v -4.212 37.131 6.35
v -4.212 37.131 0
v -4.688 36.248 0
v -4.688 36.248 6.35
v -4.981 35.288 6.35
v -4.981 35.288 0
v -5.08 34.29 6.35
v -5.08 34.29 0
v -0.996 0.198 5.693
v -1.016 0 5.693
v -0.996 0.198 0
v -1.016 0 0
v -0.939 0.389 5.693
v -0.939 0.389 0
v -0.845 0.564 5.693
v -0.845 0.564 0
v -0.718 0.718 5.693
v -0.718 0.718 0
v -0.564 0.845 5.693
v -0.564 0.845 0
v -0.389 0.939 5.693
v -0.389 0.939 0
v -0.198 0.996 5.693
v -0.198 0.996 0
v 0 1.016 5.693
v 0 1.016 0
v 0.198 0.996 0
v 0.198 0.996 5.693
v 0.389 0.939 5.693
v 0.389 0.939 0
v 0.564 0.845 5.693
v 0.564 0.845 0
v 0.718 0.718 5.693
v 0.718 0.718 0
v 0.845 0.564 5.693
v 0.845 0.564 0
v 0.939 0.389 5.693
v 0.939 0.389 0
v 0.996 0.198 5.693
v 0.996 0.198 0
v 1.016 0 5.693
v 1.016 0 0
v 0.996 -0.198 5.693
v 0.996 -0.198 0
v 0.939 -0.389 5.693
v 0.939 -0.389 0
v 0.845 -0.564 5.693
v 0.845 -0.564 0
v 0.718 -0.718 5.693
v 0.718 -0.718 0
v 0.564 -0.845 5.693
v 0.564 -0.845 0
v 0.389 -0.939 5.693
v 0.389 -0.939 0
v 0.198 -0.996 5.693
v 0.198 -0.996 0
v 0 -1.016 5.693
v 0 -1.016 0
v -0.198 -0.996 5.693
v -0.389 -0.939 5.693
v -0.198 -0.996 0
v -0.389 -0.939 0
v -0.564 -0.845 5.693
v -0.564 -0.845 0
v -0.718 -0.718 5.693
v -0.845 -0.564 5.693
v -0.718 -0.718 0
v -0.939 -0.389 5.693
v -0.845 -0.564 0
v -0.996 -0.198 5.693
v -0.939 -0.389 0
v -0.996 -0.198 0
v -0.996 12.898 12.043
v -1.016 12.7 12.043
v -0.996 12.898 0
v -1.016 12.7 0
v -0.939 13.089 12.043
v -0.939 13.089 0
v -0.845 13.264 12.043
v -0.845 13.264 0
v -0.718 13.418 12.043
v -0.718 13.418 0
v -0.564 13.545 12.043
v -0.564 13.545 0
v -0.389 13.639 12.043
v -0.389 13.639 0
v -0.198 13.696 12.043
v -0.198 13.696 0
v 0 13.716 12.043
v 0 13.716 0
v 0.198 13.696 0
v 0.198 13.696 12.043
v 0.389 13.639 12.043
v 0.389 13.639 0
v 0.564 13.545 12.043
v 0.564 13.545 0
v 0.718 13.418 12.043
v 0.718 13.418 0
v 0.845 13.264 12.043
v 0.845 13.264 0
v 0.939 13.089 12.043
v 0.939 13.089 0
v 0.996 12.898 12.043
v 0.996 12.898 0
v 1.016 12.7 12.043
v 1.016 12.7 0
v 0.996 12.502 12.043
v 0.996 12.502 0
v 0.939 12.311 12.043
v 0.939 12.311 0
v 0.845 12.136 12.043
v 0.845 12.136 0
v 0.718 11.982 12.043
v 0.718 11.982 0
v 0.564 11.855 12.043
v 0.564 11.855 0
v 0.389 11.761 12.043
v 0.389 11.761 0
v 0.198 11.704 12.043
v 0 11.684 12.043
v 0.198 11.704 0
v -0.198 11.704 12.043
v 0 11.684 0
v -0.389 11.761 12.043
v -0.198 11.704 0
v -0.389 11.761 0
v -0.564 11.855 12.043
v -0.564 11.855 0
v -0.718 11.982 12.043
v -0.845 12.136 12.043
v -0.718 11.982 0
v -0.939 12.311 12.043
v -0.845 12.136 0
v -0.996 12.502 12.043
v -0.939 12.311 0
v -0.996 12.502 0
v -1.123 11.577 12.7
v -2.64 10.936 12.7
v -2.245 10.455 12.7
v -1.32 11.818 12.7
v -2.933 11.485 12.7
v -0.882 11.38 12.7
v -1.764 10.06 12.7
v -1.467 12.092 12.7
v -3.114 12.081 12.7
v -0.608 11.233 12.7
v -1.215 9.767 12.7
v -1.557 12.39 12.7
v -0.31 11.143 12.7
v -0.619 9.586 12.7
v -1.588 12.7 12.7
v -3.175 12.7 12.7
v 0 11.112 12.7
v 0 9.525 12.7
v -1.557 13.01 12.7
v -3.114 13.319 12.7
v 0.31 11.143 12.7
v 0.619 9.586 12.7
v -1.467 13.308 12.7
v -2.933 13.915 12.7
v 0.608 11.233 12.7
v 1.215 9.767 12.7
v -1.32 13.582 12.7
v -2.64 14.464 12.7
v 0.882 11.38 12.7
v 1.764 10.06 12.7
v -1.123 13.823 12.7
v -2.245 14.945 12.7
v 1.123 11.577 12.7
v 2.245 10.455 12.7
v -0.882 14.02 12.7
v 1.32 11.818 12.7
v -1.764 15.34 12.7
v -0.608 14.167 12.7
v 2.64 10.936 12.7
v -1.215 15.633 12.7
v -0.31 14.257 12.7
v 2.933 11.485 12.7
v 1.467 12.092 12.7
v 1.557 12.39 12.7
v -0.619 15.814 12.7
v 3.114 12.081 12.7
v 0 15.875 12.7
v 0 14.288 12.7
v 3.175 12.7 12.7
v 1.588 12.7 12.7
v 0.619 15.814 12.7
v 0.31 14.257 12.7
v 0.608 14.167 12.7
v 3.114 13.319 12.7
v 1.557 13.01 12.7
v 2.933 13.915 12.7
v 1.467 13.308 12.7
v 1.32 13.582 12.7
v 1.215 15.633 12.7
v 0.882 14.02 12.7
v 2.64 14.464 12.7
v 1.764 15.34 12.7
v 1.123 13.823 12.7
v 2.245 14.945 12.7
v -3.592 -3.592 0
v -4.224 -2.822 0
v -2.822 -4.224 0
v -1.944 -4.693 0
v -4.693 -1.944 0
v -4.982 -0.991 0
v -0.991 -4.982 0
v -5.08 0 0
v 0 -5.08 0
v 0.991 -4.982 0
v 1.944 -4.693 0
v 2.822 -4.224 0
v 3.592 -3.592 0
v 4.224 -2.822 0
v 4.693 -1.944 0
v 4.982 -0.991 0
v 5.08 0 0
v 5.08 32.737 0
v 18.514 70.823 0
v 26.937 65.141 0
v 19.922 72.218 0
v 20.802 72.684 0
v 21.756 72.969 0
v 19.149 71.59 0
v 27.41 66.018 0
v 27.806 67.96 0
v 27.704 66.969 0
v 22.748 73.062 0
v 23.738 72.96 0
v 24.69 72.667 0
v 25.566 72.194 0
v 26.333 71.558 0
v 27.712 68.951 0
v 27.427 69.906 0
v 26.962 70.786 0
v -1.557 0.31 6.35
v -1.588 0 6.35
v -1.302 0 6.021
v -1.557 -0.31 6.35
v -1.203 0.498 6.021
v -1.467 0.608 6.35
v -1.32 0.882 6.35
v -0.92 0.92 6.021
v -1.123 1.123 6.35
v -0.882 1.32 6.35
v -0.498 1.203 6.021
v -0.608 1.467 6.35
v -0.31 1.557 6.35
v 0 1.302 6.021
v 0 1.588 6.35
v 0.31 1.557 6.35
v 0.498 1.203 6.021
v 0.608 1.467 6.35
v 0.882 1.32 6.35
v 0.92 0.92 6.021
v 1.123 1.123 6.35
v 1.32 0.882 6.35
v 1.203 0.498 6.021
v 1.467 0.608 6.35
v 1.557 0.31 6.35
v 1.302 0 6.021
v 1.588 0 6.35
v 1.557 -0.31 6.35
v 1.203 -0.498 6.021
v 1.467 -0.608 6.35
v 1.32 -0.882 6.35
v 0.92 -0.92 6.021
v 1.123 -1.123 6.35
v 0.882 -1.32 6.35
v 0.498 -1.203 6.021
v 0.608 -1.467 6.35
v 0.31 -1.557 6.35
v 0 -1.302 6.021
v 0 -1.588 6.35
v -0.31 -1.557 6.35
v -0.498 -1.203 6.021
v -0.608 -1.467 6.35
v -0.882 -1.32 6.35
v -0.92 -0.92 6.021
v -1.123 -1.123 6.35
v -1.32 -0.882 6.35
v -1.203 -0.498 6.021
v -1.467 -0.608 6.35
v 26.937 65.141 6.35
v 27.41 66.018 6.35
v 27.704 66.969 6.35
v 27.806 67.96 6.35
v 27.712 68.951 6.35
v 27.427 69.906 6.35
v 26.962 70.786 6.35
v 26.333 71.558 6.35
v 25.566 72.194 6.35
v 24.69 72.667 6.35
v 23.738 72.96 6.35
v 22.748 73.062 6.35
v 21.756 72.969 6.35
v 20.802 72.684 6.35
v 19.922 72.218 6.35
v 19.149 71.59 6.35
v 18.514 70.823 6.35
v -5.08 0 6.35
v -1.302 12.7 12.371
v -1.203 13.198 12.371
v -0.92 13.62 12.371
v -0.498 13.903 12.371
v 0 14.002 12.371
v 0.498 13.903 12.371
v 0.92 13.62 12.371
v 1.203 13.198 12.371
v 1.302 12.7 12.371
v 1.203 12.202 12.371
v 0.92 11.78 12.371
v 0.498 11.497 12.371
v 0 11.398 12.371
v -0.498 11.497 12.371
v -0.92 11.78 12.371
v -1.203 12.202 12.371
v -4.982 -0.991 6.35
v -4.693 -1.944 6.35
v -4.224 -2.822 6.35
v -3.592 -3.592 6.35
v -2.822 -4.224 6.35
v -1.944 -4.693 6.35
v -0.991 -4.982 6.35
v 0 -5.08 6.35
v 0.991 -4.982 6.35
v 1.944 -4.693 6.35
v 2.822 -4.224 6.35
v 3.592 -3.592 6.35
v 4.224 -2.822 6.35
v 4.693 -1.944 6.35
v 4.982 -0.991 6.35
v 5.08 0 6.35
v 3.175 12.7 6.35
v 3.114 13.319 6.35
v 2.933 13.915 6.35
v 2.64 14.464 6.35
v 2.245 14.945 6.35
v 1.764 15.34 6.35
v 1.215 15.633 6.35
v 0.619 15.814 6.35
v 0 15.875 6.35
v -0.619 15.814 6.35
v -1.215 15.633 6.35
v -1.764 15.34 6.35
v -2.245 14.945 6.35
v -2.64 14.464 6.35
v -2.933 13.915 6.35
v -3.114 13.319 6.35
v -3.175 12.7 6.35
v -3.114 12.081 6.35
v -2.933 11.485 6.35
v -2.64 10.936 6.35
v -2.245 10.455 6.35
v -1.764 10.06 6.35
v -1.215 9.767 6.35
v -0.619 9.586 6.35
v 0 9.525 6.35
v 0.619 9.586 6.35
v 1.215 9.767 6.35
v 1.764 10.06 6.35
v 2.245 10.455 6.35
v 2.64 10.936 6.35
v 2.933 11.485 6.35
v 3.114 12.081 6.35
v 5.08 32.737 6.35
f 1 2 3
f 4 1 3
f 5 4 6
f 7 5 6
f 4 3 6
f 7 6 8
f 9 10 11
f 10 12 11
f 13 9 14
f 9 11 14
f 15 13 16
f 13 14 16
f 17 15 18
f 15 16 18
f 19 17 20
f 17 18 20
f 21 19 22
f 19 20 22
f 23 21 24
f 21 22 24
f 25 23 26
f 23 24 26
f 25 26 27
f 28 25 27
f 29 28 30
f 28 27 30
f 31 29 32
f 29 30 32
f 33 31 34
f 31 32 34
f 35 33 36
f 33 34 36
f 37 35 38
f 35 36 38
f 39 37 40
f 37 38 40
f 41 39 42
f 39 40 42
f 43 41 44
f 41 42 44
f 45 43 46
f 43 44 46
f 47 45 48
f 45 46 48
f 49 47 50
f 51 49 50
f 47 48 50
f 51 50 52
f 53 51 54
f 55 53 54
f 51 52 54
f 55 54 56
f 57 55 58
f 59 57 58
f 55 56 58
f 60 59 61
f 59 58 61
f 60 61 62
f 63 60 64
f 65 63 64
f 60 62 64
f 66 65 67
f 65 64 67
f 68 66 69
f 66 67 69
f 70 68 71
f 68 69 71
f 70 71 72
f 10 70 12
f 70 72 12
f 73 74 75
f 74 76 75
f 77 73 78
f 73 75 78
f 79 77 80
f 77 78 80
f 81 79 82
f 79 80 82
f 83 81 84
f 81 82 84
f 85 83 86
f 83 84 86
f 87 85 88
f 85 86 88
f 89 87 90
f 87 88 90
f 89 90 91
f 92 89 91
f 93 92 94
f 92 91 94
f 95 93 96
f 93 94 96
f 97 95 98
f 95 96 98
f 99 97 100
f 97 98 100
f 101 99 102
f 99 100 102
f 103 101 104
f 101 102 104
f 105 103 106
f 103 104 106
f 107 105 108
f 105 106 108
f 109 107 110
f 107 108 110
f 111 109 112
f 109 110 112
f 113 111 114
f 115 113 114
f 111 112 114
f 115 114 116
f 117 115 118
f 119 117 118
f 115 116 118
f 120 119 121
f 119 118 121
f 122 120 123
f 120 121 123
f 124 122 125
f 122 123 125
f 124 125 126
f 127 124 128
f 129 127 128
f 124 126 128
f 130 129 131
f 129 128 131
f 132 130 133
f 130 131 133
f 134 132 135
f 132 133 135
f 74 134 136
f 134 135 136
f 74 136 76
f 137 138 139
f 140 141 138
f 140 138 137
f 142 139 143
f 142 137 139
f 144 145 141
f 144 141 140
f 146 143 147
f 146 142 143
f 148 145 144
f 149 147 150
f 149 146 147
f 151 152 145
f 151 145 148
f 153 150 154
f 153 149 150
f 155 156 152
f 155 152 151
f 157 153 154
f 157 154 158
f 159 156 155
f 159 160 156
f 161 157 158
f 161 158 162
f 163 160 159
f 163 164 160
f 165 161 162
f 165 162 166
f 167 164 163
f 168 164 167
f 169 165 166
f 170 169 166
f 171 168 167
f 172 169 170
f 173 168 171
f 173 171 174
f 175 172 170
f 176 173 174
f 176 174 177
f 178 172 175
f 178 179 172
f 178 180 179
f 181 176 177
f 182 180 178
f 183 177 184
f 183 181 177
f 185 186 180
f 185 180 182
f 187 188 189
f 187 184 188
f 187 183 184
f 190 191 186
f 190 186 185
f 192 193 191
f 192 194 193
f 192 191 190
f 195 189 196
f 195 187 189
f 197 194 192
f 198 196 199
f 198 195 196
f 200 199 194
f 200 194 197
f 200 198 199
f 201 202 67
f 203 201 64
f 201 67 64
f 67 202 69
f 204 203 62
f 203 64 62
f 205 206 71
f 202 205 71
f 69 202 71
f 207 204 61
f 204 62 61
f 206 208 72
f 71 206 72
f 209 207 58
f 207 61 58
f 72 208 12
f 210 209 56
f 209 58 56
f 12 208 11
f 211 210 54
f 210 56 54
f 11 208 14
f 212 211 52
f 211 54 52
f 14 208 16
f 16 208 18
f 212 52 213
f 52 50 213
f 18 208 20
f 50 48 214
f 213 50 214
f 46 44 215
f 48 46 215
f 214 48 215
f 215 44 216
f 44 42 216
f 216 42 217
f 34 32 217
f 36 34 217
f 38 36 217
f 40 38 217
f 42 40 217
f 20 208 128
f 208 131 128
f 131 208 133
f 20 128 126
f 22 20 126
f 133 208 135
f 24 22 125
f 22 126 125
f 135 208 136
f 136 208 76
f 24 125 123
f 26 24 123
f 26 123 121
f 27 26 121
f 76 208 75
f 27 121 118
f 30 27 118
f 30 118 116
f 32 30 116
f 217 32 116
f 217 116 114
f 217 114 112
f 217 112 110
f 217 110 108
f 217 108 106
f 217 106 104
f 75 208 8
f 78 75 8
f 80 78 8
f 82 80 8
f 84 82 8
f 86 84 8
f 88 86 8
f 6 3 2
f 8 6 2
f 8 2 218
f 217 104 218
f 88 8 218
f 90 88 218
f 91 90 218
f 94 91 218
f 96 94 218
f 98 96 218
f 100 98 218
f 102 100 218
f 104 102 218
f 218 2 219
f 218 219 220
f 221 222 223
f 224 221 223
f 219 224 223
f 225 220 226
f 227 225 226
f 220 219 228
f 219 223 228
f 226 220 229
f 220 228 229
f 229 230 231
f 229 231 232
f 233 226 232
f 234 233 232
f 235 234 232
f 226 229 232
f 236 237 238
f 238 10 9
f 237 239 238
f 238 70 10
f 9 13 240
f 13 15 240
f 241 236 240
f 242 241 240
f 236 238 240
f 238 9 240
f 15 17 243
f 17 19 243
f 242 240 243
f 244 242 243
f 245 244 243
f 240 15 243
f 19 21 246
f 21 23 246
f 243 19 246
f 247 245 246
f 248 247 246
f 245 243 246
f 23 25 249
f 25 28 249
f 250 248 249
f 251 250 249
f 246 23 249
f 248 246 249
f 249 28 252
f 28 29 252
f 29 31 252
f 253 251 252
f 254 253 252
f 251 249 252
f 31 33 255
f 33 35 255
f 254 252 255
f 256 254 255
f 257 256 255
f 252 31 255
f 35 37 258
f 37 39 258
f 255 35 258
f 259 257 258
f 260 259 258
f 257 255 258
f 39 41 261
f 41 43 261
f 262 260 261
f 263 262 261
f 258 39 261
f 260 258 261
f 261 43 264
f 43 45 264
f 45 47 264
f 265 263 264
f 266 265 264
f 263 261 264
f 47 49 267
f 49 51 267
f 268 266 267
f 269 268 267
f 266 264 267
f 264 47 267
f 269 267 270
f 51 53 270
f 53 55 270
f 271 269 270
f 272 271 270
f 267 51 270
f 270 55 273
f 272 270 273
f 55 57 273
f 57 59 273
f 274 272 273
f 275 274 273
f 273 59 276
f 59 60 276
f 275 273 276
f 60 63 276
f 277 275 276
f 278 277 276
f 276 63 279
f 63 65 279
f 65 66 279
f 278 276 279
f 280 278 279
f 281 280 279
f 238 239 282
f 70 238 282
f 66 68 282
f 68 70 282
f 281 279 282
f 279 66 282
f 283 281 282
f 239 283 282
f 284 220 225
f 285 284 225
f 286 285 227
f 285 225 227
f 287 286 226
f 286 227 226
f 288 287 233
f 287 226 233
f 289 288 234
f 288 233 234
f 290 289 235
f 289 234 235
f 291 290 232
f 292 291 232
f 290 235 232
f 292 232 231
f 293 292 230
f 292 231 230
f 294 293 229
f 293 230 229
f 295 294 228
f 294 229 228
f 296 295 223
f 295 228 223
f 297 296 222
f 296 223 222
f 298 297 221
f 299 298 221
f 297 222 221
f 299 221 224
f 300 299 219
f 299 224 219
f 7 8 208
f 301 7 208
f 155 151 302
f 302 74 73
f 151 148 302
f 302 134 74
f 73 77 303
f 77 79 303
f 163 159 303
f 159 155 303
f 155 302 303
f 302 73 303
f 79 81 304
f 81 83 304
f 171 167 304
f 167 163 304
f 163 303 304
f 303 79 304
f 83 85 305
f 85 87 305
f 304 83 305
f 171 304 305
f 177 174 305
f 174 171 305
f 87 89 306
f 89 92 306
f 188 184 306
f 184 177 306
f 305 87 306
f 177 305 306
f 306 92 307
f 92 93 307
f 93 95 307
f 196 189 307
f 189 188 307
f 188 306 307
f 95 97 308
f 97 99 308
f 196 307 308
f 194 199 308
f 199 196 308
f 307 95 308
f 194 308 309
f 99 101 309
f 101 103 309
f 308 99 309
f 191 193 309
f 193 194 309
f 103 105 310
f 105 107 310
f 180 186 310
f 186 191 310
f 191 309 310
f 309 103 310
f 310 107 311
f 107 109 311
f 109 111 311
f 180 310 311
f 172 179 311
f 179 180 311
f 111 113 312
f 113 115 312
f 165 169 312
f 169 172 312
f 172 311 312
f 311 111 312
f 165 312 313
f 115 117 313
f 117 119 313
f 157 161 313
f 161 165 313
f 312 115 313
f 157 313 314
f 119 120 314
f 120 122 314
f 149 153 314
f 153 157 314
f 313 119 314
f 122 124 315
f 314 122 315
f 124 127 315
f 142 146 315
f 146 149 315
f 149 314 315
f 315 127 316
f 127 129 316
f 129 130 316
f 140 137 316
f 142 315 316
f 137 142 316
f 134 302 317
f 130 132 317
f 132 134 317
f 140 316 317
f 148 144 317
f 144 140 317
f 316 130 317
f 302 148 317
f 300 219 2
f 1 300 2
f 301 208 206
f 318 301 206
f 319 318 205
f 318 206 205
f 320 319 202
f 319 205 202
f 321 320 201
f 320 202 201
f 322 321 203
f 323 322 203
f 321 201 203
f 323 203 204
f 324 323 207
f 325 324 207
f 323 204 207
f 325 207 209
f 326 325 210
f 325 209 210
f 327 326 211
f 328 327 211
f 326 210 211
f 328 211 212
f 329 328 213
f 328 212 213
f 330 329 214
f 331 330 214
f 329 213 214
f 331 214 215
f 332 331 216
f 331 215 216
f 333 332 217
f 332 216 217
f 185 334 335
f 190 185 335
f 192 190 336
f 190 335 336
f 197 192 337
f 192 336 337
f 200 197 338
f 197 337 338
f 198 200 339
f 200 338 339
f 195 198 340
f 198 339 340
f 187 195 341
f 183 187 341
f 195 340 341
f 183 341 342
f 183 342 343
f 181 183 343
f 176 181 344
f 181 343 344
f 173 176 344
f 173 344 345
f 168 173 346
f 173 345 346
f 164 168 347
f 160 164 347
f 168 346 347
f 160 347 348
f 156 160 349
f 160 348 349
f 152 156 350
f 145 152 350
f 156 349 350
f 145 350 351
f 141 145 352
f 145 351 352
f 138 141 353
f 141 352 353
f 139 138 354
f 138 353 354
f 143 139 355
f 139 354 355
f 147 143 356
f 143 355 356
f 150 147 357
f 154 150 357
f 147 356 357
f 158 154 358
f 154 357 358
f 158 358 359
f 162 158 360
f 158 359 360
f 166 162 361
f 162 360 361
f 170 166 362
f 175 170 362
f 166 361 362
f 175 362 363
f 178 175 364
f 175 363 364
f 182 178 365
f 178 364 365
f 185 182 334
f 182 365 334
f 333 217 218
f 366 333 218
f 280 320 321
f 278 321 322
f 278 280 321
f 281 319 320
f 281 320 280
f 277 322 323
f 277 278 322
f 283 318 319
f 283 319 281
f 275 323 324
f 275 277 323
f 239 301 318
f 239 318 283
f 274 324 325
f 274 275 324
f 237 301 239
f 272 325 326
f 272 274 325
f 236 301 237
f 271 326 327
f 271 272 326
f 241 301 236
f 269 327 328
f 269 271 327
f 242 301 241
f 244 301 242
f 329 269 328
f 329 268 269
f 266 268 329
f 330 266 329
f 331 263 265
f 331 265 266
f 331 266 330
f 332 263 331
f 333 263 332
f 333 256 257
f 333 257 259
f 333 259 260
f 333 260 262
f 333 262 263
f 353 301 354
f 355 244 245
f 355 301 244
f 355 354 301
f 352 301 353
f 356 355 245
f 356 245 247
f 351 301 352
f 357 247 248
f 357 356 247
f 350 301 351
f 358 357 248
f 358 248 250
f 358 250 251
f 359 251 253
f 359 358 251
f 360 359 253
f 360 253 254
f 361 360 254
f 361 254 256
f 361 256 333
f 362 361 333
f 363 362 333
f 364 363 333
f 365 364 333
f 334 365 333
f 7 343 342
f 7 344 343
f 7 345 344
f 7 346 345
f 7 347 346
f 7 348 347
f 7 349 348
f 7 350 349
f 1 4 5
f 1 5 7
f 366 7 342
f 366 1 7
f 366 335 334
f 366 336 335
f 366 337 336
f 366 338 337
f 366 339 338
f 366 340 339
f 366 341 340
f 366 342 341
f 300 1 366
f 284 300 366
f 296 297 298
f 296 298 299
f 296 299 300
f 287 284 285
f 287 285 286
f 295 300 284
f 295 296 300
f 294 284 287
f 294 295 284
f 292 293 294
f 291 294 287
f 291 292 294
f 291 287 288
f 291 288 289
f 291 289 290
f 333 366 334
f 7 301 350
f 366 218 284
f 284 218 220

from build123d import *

# Parameters (mm, degrees)
F1_DEPTH       = 6.35
F2_R           = 3.175
F3_DEPTH       = 6.35
F5_D           = 2.032
F5_CSINK_D     = 3.175
F5_CSINK_ANGLE = 82
F7_D           = 2.032
F7_CSINK_D     = 3.175
F7_CSINK_ANGLE = 82


with BuildPart() as f1:
    # F0 (on Top) → F1 (new body)
    with BuildSketch(Plane.XY):
        with BuildLine():
            ThreePointArc((-5.08, 12.7), (-3.5921024484, 9.1078975516), (0, 7.62))
            Line((0, 7.62), (0, 12.7))
            Line((0, 12.7), (0, 17.78))
            ThreePointArc((0, 17.78), (-3.5921024484, 16.2921024484), (-5.08, 12.7))
        make_face()
        with BuildLine():
            Line((0, 12.7), (0, 7.62))
            ThreePointArc((0, 7.62), (3.5921024484, 9.1078975516), (5.08, 12.7))
            ThreePointArc((5.08, 12.7), (3.5921024484, 16.2921024484), (0, 17.78))
            Line((0, 17.78), (0, 12.7))
        make_face()
        with BuildLine():
            ThreePointArc((5.08, 12.7), (3.5921024484, 9.1078975516), (0, 7.62))
            ThreePointArc((0, 7.62), (-3.5921024484, 9.1078975516), (-5.08, 12.7))
            Line((-5.08, 12.7), (-5.08, 0))
            ThreePointArc((-5.08, 0), (0, -5.08), (5.08, 0))
            Line((5.08, 0), (5.08, 12.7))
        make_face()
        with BuildLine():
            ThreePointArc((0, 17.78), (3.5921024484, 16.2921024484), (5.08, 12.7))
            Line((5.08, 12.7), (5.08, 32.7368881382))
            Line((5.08, 32.7368881382), (4.2115108686, 31.4493000504))
            ThreePointArc((4.2115108686, 31.4493000504), (2.384915539, 29.8046262283), (0, 29.21))
            Line((0, 29.21), (0, 17.78))
        make_face()
        with BuildLine():
            Line((-5.08, 34.29), (-5.08, 12.7))
            ThreePointArc((-5.08, 12.7), (-3.5921024484, 16.2921024484), (0, 17.78))
            Line((0, 17.78), (0, 29.21))
            ThreePointArc((0, 29.21), (-3.5921024484, 30.6978975516), (-5.08, 34.29))
        make_face()
        with BuildLine():
            Line((5.08, 34.29), (5.08, 32.7368881382))
            Line((5.08, 32.7368881382), (26.9371104656, 65.141386999))
            ThreePointArc((26.9371104656, 65.141386999), (25.5662995467, 72.1935978172), (18.5140887285, 70.8227868983))
            Line((18.5140887285, 70.8227868983), (-4.2115108686, 37.1306999496))
            ThreePointArc((-4.2115108686, 37.1306999496), (-0.9693096965, 39.2766660919), (2.8406999496, 38.5015108686))
            ThreePointArc((2.8406999496, 38.5015108686), (4.4853737717, 36.674915539), (5.08, 34.29))
        make_face()
        with BuildLine():
            Line((4.2115108686, 31.4493000504), (5.08, 32.7368881382))
            Line((5.08, 32.7368881382), (5.08, 34.29))
            ThreePointArc((5.08, 34.29), (4.4853737717, 36.674915539), (2.8406999496, 38.5015108686))
            Line((2.8406999496, 38.5015108686), (0, 34.29))
            Line((0, 34.29), (0, 29.21))
            ThreePointArc((0, 29.21), (2.384915539, 29.8046262283), (4.2115108686, 31.4493000504))
        make_face()
        with BuildLine():
            ThreePointArc((-4.2115108686, 37.1306999496), (-4.8580281603, 35.77524826), (-5.08, 34.29))
            ThreePointArc((-5.08, 34.29), (-3.5921024484, 30.6978975516), (0, 29.21))
            Line((0, 29.21), (0, 34.29))
            Line((0, 34.29), (2.8406999496, 38.5015108686))
            ThreePointArc((2.8406999496, 38.5015108686), (-0.9693096965, 39.2766660919), (-4.2115108686, 37.1306999496))
        make_face()
    extrude(amount=F1_DEPTH)

    # F2 (on face) → F3 (join)
    with BuildSketch(Plane.XY.offset(6.35)):
        with Locations((0, 12.7)):
            Circle(F2_R)
    extrude(amount=F3_DEPTH)

    # F5 (through all)
    with Locations(Plane.XY.offset(12.7)):
        with Locations((0, 12.7)):
            CounterSinkHole(F5_D / 2, F5_CSINK_D / 2, counter_sink_angle=F5_CSINK_ANGLE)

    # F7 (through all)
    with Locations(Plane.XY.offset(6.35)):
        with Locations((0, 0)):
            CounterSinkHole(F7_D / 2, F7_CSINK_D / 2, counter_sink_angle=F7_CSINK_ANGLE)


solid = f1.part
